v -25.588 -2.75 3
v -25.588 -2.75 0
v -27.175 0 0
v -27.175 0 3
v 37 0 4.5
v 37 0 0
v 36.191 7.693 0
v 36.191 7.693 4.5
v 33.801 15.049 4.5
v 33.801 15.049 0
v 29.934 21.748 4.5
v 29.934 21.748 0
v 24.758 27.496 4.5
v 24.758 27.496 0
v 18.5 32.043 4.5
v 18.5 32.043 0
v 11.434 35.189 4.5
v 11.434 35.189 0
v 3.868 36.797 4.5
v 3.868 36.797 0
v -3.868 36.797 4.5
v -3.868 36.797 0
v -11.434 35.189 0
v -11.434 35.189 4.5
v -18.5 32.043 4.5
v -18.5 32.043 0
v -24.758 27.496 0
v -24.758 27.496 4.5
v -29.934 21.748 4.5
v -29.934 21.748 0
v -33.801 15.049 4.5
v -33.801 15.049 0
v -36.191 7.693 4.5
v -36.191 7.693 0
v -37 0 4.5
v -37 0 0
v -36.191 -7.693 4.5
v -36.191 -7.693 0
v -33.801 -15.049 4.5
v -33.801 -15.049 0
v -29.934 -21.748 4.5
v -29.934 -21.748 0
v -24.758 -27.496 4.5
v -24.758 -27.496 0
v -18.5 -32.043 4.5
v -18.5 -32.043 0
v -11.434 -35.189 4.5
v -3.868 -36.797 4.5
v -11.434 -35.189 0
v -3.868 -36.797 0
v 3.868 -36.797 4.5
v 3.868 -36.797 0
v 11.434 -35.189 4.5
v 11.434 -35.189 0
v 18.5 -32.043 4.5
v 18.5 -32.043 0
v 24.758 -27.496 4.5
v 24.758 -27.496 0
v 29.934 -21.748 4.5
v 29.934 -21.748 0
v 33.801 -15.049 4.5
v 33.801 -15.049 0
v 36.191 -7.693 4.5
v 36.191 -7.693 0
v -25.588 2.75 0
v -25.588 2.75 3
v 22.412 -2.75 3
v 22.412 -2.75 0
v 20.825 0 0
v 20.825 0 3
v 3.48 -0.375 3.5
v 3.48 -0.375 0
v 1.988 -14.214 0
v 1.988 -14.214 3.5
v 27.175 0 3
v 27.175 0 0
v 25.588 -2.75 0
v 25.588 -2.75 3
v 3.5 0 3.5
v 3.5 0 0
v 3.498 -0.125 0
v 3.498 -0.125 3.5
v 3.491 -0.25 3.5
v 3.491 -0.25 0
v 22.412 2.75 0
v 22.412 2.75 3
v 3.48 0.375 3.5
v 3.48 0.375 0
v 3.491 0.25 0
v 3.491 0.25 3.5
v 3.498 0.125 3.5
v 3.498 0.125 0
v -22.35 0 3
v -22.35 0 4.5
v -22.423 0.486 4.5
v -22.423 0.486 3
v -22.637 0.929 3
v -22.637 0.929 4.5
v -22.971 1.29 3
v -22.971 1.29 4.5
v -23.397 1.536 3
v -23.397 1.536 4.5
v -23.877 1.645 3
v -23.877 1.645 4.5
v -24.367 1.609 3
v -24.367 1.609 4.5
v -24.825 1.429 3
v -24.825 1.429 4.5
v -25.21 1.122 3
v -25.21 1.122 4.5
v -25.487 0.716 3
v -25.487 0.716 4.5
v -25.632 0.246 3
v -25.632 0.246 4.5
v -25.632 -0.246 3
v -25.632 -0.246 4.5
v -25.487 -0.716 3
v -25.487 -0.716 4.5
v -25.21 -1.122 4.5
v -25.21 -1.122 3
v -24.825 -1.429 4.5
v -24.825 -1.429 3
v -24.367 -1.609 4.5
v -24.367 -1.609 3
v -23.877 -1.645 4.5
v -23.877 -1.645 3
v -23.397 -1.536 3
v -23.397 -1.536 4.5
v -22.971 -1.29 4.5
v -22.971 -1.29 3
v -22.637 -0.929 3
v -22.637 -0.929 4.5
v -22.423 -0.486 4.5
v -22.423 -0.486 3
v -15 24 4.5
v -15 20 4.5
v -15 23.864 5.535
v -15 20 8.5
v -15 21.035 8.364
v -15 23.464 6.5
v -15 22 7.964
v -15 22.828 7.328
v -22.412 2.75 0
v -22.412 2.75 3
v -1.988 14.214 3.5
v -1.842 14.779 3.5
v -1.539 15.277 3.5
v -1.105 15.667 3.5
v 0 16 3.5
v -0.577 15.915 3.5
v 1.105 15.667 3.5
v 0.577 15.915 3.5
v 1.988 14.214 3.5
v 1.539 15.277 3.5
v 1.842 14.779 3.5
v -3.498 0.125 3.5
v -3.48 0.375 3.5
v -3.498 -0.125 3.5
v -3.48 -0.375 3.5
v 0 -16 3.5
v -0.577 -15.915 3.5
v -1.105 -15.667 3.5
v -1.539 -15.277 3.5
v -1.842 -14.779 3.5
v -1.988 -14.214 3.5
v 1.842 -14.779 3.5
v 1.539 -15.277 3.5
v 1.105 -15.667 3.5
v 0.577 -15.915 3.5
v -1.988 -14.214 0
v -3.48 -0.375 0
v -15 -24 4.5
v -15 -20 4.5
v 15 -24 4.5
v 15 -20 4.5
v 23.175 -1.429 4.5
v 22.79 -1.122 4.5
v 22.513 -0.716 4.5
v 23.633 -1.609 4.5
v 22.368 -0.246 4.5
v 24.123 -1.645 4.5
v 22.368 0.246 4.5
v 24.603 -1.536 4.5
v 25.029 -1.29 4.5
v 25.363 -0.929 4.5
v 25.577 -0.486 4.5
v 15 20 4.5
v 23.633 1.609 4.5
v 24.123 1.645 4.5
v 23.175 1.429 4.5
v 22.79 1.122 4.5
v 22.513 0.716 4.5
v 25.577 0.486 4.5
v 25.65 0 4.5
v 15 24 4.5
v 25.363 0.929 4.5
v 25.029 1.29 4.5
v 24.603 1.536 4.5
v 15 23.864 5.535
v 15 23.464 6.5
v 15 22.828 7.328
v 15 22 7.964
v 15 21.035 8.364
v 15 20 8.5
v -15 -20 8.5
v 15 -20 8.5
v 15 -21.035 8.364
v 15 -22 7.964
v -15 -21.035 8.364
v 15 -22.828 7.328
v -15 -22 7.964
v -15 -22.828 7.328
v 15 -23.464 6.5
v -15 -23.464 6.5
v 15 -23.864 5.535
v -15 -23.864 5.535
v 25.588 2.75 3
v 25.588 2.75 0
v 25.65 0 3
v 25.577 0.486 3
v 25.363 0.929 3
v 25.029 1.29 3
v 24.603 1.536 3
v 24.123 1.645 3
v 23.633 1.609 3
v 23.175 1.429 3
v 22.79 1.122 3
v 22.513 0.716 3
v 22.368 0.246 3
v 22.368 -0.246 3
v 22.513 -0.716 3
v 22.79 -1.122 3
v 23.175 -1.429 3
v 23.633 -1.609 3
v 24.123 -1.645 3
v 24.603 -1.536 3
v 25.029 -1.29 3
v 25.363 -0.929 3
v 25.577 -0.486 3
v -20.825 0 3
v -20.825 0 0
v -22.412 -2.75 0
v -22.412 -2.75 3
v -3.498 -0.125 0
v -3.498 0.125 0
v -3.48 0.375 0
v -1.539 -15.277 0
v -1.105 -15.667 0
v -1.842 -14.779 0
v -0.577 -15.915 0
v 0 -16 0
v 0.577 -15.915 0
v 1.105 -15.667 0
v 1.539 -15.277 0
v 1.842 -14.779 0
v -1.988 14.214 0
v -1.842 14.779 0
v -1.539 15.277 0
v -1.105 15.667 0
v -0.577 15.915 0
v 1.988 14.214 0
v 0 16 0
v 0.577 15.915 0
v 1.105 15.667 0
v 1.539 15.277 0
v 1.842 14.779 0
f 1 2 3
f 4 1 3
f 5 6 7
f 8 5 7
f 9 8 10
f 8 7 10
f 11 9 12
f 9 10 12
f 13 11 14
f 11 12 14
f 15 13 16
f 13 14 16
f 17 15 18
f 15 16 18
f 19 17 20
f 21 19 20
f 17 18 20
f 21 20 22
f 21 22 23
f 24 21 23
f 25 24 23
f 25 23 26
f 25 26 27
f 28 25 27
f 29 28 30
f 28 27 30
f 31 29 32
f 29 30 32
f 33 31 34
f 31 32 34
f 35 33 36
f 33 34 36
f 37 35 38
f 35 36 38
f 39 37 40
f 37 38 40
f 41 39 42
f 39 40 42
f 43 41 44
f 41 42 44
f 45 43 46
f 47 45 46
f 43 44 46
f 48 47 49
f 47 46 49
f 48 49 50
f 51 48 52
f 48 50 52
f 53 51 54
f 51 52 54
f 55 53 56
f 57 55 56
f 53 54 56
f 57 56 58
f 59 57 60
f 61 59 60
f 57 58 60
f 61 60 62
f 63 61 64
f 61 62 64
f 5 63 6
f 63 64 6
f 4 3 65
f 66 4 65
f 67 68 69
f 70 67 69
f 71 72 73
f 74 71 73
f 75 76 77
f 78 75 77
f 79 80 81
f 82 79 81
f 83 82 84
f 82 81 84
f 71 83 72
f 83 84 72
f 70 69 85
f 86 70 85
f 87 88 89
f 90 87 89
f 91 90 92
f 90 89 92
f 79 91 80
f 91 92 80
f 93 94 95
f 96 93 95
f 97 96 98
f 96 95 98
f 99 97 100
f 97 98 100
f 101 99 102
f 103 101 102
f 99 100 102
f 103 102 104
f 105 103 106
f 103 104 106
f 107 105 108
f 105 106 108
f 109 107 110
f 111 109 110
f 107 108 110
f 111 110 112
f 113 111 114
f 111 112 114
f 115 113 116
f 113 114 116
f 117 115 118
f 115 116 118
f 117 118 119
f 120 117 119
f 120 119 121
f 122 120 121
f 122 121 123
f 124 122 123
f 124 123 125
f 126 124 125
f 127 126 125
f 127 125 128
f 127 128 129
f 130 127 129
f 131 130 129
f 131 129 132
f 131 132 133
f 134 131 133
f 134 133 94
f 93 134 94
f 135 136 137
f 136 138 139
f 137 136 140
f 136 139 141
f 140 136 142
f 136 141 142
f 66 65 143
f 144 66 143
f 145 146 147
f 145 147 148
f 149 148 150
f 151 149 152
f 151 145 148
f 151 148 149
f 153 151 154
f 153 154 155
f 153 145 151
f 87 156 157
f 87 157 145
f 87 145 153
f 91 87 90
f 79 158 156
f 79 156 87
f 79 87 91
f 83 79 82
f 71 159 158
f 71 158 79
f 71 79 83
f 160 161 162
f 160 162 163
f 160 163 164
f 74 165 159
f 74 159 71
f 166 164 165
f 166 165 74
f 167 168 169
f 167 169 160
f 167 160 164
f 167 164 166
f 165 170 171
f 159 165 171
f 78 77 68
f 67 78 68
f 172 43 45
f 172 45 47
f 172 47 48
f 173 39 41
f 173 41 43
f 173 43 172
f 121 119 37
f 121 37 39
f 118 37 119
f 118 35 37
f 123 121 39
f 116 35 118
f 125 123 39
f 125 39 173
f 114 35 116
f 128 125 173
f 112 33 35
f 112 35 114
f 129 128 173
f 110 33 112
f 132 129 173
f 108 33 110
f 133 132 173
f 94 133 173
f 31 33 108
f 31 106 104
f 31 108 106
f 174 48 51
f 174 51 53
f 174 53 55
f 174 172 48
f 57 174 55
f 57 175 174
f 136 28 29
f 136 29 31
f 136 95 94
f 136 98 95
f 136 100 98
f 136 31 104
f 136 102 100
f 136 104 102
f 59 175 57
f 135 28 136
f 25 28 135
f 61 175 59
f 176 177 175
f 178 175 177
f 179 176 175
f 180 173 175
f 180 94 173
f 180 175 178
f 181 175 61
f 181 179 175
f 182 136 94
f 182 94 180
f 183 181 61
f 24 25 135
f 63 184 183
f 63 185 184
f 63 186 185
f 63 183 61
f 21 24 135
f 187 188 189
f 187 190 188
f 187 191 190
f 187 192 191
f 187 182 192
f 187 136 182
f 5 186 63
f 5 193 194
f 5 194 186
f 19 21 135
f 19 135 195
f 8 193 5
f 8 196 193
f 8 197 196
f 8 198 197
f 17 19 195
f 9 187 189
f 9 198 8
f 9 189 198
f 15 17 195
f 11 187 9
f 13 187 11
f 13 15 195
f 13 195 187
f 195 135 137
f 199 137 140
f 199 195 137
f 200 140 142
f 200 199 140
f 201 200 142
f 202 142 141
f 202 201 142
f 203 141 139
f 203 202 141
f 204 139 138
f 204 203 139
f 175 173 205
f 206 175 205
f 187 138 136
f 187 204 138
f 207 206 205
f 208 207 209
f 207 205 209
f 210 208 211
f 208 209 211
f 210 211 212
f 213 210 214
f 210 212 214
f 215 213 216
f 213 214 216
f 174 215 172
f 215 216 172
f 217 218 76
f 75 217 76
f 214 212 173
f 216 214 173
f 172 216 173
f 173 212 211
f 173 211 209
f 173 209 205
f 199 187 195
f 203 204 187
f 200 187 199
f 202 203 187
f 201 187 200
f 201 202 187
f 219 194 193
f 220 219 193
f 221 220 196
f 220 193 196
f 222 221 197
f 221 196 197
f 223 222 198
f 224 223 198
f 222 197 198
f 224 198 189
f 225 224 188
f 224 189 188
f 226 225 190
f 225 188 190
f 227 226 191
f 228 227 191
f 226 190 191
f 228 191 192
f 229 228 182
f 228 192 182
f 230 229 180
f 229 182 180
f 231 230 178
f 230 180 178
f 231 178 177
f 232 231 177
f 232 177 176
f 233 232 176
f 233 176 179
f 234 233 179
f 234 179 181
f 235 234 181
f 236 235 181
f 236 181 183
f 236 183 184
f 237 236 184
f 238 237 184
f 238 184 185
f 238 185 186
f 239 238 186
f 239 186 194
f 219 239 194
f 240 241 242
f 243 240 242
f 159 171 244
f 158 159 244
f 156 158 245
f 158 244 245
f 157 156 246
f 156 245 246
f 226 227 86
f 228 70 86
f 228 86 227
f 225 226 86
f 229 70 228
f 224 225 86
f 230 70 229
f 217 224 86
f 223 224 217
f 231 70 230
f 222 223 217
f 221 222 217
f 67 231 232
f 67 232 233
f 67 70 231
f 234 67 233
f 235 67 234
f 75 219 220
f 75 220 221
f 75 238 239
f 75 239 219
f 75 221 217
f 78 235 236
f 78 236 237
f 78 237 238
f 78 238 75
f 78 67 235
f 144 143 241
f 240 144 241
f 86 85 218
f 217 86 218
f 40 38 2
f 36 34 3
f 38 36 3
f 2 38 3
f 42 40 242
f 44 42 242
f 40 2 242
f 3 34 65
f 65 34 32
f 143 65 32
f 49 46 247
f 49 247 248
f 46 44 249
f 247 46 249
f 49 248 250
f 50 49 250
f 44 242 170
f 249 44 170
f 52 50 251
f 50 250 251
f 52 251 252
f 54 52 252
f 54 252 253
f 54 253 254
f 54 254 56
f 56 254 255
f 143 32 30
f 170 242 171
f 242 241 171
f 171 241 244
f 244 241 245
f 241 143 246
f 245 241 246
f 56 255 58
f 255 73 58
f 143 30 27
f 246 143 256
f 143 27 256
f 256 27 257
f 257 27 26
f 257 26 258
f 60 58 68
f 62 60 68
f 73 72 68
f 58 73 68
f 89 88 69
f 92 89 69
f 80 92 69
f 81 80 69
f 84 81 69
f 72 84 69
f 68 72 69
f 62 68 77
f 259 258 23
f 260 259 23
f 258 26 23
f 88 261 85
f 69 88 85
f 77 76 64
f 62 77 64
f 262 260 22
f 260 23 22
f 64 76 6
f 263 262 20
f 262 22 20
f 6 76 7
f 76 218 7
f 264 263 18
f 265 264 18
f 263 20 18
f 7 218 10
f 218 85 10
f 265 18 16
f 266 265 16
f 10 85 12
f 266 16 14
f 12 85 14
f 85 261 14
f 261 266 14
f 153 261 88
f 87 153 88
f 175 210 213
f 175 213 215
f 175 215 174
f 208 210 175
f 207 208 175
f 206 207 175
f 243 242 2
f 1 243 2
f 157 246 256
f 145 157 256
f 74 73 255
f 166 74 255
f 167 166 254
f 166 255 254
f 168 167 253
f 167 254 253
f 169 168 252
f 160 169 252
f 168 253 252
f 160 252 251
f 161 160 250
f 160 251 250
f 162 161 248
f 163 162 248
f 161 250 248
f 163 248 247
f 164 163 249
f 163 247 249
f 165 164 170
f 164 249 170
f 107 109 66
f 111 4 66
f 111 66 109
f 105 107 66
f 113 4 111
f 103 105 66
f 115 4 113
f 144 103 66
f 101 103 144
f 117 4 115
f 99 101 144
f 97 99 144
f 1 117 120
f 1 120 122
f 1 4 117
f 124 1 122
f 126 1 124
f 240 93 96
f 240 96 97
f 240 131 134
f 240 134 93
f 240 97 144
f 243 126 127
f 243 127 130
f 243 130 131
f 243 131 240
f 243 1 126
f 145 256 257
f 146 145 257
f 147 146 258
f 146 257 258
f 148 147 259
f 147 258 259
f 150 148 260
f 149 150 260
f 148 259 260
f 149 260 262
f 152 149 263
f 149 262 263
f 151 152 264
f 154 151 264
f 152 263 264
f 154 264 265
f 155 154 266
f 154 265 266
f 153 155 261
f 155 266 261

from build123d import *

# Parameters (mm, degrees)
F0_R     = 37
F1_DEPTH = 4.5
F3_DEPTH = 3.5
F5_DEPTH = 15
F6_R     = 1.65
F7_DEPTH = 4.501
F9_DEPTH = 3


with BuildPart() as f1:
    # F0 (on Top) → F1 (new body)
    with BuildSketch(Plane.XY):
        Circle(F0_R)
    extrude(amount=F1_DEPTH)

    # F2 (on face) → F3 (cut)
    with BuildSketch(Plane(origin=(0, 0, 0), x_dir=(1, 0, 0), z_dir=(0, 0, -1))):
        with BuildLine():
            ThreePointArc((3.479853, -0.375), (3.49496, -0.18777), (3.5, 0))
            ThreePointArc((3.5, 0), (3.49496, 0.18777), (3.479853, 0.375))
            ThreePointArc((3.479853, 0.375), (2.338536, 2.604083), (0, 3.5))
            ThreePointArc((0, 3.5), (-2.338536, 2.604083), (-3.479853, 0.375))
            ThreePointArc((-3.479853, 0.375), (-3.5, 0), (-3.479853, -0.375))
            ThreePointArc((-3.479853, -0.375), (0, -3.5), (3.479853, -0.375))
        make_face()
        with BuildLine():
            ThreePointArc((0, 3.5), (2.338536, 2.604083), (3.479853, 0.375))
            Line((3.479853, 0.375), (1.988487, 14.214286))
            ThreePointArc((1.988487, 14.214286), (1.99712, 14.107297), (2, 14))
            ThreePointArc((2, 14), (1.414214, 12.585786), (0, 12))
            Line((0, 12), (0, 3.5))
        make_face()
        with BuildLine():
            Line((1.988487, -14.214286), (3.479853, -0.375))
            ThreePointArc((3.479853, -0.375), (0, -3.5), (-3.479853, -0.375))
            Line((-3.479853, -0.375), (-1.988487, -14.214286))
            ThreePointArc((-1.988487, -14.214286), (-0.107297, -12.00288), (2, -14))
            ThreePointArc((2, -14), (1.99712, -14.107297), (1.988487, -14.214286))
        make_face()
        with BuildLine():
            ThreePointArc((-3.479853, 0.375), (-2.338536, 2.604083), (0, 3.5))
            Line((0, 3.5), (0, 12))
            ThreePointArc((0, 12), (-1.488048, 12.663694), (-1.988487, 14.214286))
            Line((-1.988487, 14.214286), (-3.479853, 0.375))
        make_face()
        with BuildLine():
            ThreePointArc((2, 14), (1.99712, 14.107297), (1.988487, 14.214286))
            ThreePointArc((1.988487, 14.214286), (0, 16), (-1.988487, 14.214286))
            ThreePointArc((-1.988487, 14.214286), (-1.488048, 12.663694), (0, 12))
            ThreePointArc((0, 12), (1.414214, 12.585786), (2, 14))
        make_face()
        with BuildLine():
            ThreePointArc((-1.988487, -14.214286), (0, -16), (1.988487, -14.214286))
            ThreePointArc((1.988487, -14.214286), (1.99712, -14.107297), (2, -14))
            ThreePointArc((2, -14), (-0.107297, -12.00288), (-1.988487, -14.214286))
        make_face()
    extrude(amount=-F3_DEPTH, mode=Mode.SUBTRACT)

    # F4 (on Right) → F5 (join, symmetric)
    with BuildSketch(Plane.YZ):
        with BuildLine():
            ThreePointArc((-20, 8.5), (-22.828427, 7.328427), (-24, 4.5))
            Line((-24, 4.5), (-20, 4.5))
            Line((-20, 4.5), (-20, 8.5))
        make_face()
        with BuildLine():
            Line((20, 8.5), (20, 4.5))
            Line((20, 4.5), (24, 4.5))
            ThreePointArc((24, 4.5), (22.828427, 7.328427), (20, 8.5))
        make_face()
    extrude(amount=F5_DEPTH, both=True)

    # F6 (on face) → F7 (cut, through all)
    with BuildSketch(Plane.XY.offset(4.5)):
        with Locations((-24, 0)):
            Circle(F6_R)
        with Locations((24, 0)):
            Circle(F6_R)
    extrude(amount=-F7_DEPTH, mode=Mode.SUBTRACT)

    # F8 (on face) → F9 (cut)
    with BuildSketch(Plane(origin=(0, 0, 0), x_dir=(1, 0, 0), z_dir=(0, 0, -1))):
        Polygon((22.412287, 2.75), (20.824574, 0), (22.412287, -2.75), (25.587713, -2.75), (27.175426, 0), (25.587713, 2.75), align=None)
        Polygon((-22.412287, -2.75), (-20.824574, 0), (-22.412287, 2.75), (-25.587713, 2.75), (-27.175426, 0), (-25.587713, -2.75), align=None)
    extrude(amount=-F9_DEPTH, mode=Mode.SUBTRACT)


solid = f1.part
